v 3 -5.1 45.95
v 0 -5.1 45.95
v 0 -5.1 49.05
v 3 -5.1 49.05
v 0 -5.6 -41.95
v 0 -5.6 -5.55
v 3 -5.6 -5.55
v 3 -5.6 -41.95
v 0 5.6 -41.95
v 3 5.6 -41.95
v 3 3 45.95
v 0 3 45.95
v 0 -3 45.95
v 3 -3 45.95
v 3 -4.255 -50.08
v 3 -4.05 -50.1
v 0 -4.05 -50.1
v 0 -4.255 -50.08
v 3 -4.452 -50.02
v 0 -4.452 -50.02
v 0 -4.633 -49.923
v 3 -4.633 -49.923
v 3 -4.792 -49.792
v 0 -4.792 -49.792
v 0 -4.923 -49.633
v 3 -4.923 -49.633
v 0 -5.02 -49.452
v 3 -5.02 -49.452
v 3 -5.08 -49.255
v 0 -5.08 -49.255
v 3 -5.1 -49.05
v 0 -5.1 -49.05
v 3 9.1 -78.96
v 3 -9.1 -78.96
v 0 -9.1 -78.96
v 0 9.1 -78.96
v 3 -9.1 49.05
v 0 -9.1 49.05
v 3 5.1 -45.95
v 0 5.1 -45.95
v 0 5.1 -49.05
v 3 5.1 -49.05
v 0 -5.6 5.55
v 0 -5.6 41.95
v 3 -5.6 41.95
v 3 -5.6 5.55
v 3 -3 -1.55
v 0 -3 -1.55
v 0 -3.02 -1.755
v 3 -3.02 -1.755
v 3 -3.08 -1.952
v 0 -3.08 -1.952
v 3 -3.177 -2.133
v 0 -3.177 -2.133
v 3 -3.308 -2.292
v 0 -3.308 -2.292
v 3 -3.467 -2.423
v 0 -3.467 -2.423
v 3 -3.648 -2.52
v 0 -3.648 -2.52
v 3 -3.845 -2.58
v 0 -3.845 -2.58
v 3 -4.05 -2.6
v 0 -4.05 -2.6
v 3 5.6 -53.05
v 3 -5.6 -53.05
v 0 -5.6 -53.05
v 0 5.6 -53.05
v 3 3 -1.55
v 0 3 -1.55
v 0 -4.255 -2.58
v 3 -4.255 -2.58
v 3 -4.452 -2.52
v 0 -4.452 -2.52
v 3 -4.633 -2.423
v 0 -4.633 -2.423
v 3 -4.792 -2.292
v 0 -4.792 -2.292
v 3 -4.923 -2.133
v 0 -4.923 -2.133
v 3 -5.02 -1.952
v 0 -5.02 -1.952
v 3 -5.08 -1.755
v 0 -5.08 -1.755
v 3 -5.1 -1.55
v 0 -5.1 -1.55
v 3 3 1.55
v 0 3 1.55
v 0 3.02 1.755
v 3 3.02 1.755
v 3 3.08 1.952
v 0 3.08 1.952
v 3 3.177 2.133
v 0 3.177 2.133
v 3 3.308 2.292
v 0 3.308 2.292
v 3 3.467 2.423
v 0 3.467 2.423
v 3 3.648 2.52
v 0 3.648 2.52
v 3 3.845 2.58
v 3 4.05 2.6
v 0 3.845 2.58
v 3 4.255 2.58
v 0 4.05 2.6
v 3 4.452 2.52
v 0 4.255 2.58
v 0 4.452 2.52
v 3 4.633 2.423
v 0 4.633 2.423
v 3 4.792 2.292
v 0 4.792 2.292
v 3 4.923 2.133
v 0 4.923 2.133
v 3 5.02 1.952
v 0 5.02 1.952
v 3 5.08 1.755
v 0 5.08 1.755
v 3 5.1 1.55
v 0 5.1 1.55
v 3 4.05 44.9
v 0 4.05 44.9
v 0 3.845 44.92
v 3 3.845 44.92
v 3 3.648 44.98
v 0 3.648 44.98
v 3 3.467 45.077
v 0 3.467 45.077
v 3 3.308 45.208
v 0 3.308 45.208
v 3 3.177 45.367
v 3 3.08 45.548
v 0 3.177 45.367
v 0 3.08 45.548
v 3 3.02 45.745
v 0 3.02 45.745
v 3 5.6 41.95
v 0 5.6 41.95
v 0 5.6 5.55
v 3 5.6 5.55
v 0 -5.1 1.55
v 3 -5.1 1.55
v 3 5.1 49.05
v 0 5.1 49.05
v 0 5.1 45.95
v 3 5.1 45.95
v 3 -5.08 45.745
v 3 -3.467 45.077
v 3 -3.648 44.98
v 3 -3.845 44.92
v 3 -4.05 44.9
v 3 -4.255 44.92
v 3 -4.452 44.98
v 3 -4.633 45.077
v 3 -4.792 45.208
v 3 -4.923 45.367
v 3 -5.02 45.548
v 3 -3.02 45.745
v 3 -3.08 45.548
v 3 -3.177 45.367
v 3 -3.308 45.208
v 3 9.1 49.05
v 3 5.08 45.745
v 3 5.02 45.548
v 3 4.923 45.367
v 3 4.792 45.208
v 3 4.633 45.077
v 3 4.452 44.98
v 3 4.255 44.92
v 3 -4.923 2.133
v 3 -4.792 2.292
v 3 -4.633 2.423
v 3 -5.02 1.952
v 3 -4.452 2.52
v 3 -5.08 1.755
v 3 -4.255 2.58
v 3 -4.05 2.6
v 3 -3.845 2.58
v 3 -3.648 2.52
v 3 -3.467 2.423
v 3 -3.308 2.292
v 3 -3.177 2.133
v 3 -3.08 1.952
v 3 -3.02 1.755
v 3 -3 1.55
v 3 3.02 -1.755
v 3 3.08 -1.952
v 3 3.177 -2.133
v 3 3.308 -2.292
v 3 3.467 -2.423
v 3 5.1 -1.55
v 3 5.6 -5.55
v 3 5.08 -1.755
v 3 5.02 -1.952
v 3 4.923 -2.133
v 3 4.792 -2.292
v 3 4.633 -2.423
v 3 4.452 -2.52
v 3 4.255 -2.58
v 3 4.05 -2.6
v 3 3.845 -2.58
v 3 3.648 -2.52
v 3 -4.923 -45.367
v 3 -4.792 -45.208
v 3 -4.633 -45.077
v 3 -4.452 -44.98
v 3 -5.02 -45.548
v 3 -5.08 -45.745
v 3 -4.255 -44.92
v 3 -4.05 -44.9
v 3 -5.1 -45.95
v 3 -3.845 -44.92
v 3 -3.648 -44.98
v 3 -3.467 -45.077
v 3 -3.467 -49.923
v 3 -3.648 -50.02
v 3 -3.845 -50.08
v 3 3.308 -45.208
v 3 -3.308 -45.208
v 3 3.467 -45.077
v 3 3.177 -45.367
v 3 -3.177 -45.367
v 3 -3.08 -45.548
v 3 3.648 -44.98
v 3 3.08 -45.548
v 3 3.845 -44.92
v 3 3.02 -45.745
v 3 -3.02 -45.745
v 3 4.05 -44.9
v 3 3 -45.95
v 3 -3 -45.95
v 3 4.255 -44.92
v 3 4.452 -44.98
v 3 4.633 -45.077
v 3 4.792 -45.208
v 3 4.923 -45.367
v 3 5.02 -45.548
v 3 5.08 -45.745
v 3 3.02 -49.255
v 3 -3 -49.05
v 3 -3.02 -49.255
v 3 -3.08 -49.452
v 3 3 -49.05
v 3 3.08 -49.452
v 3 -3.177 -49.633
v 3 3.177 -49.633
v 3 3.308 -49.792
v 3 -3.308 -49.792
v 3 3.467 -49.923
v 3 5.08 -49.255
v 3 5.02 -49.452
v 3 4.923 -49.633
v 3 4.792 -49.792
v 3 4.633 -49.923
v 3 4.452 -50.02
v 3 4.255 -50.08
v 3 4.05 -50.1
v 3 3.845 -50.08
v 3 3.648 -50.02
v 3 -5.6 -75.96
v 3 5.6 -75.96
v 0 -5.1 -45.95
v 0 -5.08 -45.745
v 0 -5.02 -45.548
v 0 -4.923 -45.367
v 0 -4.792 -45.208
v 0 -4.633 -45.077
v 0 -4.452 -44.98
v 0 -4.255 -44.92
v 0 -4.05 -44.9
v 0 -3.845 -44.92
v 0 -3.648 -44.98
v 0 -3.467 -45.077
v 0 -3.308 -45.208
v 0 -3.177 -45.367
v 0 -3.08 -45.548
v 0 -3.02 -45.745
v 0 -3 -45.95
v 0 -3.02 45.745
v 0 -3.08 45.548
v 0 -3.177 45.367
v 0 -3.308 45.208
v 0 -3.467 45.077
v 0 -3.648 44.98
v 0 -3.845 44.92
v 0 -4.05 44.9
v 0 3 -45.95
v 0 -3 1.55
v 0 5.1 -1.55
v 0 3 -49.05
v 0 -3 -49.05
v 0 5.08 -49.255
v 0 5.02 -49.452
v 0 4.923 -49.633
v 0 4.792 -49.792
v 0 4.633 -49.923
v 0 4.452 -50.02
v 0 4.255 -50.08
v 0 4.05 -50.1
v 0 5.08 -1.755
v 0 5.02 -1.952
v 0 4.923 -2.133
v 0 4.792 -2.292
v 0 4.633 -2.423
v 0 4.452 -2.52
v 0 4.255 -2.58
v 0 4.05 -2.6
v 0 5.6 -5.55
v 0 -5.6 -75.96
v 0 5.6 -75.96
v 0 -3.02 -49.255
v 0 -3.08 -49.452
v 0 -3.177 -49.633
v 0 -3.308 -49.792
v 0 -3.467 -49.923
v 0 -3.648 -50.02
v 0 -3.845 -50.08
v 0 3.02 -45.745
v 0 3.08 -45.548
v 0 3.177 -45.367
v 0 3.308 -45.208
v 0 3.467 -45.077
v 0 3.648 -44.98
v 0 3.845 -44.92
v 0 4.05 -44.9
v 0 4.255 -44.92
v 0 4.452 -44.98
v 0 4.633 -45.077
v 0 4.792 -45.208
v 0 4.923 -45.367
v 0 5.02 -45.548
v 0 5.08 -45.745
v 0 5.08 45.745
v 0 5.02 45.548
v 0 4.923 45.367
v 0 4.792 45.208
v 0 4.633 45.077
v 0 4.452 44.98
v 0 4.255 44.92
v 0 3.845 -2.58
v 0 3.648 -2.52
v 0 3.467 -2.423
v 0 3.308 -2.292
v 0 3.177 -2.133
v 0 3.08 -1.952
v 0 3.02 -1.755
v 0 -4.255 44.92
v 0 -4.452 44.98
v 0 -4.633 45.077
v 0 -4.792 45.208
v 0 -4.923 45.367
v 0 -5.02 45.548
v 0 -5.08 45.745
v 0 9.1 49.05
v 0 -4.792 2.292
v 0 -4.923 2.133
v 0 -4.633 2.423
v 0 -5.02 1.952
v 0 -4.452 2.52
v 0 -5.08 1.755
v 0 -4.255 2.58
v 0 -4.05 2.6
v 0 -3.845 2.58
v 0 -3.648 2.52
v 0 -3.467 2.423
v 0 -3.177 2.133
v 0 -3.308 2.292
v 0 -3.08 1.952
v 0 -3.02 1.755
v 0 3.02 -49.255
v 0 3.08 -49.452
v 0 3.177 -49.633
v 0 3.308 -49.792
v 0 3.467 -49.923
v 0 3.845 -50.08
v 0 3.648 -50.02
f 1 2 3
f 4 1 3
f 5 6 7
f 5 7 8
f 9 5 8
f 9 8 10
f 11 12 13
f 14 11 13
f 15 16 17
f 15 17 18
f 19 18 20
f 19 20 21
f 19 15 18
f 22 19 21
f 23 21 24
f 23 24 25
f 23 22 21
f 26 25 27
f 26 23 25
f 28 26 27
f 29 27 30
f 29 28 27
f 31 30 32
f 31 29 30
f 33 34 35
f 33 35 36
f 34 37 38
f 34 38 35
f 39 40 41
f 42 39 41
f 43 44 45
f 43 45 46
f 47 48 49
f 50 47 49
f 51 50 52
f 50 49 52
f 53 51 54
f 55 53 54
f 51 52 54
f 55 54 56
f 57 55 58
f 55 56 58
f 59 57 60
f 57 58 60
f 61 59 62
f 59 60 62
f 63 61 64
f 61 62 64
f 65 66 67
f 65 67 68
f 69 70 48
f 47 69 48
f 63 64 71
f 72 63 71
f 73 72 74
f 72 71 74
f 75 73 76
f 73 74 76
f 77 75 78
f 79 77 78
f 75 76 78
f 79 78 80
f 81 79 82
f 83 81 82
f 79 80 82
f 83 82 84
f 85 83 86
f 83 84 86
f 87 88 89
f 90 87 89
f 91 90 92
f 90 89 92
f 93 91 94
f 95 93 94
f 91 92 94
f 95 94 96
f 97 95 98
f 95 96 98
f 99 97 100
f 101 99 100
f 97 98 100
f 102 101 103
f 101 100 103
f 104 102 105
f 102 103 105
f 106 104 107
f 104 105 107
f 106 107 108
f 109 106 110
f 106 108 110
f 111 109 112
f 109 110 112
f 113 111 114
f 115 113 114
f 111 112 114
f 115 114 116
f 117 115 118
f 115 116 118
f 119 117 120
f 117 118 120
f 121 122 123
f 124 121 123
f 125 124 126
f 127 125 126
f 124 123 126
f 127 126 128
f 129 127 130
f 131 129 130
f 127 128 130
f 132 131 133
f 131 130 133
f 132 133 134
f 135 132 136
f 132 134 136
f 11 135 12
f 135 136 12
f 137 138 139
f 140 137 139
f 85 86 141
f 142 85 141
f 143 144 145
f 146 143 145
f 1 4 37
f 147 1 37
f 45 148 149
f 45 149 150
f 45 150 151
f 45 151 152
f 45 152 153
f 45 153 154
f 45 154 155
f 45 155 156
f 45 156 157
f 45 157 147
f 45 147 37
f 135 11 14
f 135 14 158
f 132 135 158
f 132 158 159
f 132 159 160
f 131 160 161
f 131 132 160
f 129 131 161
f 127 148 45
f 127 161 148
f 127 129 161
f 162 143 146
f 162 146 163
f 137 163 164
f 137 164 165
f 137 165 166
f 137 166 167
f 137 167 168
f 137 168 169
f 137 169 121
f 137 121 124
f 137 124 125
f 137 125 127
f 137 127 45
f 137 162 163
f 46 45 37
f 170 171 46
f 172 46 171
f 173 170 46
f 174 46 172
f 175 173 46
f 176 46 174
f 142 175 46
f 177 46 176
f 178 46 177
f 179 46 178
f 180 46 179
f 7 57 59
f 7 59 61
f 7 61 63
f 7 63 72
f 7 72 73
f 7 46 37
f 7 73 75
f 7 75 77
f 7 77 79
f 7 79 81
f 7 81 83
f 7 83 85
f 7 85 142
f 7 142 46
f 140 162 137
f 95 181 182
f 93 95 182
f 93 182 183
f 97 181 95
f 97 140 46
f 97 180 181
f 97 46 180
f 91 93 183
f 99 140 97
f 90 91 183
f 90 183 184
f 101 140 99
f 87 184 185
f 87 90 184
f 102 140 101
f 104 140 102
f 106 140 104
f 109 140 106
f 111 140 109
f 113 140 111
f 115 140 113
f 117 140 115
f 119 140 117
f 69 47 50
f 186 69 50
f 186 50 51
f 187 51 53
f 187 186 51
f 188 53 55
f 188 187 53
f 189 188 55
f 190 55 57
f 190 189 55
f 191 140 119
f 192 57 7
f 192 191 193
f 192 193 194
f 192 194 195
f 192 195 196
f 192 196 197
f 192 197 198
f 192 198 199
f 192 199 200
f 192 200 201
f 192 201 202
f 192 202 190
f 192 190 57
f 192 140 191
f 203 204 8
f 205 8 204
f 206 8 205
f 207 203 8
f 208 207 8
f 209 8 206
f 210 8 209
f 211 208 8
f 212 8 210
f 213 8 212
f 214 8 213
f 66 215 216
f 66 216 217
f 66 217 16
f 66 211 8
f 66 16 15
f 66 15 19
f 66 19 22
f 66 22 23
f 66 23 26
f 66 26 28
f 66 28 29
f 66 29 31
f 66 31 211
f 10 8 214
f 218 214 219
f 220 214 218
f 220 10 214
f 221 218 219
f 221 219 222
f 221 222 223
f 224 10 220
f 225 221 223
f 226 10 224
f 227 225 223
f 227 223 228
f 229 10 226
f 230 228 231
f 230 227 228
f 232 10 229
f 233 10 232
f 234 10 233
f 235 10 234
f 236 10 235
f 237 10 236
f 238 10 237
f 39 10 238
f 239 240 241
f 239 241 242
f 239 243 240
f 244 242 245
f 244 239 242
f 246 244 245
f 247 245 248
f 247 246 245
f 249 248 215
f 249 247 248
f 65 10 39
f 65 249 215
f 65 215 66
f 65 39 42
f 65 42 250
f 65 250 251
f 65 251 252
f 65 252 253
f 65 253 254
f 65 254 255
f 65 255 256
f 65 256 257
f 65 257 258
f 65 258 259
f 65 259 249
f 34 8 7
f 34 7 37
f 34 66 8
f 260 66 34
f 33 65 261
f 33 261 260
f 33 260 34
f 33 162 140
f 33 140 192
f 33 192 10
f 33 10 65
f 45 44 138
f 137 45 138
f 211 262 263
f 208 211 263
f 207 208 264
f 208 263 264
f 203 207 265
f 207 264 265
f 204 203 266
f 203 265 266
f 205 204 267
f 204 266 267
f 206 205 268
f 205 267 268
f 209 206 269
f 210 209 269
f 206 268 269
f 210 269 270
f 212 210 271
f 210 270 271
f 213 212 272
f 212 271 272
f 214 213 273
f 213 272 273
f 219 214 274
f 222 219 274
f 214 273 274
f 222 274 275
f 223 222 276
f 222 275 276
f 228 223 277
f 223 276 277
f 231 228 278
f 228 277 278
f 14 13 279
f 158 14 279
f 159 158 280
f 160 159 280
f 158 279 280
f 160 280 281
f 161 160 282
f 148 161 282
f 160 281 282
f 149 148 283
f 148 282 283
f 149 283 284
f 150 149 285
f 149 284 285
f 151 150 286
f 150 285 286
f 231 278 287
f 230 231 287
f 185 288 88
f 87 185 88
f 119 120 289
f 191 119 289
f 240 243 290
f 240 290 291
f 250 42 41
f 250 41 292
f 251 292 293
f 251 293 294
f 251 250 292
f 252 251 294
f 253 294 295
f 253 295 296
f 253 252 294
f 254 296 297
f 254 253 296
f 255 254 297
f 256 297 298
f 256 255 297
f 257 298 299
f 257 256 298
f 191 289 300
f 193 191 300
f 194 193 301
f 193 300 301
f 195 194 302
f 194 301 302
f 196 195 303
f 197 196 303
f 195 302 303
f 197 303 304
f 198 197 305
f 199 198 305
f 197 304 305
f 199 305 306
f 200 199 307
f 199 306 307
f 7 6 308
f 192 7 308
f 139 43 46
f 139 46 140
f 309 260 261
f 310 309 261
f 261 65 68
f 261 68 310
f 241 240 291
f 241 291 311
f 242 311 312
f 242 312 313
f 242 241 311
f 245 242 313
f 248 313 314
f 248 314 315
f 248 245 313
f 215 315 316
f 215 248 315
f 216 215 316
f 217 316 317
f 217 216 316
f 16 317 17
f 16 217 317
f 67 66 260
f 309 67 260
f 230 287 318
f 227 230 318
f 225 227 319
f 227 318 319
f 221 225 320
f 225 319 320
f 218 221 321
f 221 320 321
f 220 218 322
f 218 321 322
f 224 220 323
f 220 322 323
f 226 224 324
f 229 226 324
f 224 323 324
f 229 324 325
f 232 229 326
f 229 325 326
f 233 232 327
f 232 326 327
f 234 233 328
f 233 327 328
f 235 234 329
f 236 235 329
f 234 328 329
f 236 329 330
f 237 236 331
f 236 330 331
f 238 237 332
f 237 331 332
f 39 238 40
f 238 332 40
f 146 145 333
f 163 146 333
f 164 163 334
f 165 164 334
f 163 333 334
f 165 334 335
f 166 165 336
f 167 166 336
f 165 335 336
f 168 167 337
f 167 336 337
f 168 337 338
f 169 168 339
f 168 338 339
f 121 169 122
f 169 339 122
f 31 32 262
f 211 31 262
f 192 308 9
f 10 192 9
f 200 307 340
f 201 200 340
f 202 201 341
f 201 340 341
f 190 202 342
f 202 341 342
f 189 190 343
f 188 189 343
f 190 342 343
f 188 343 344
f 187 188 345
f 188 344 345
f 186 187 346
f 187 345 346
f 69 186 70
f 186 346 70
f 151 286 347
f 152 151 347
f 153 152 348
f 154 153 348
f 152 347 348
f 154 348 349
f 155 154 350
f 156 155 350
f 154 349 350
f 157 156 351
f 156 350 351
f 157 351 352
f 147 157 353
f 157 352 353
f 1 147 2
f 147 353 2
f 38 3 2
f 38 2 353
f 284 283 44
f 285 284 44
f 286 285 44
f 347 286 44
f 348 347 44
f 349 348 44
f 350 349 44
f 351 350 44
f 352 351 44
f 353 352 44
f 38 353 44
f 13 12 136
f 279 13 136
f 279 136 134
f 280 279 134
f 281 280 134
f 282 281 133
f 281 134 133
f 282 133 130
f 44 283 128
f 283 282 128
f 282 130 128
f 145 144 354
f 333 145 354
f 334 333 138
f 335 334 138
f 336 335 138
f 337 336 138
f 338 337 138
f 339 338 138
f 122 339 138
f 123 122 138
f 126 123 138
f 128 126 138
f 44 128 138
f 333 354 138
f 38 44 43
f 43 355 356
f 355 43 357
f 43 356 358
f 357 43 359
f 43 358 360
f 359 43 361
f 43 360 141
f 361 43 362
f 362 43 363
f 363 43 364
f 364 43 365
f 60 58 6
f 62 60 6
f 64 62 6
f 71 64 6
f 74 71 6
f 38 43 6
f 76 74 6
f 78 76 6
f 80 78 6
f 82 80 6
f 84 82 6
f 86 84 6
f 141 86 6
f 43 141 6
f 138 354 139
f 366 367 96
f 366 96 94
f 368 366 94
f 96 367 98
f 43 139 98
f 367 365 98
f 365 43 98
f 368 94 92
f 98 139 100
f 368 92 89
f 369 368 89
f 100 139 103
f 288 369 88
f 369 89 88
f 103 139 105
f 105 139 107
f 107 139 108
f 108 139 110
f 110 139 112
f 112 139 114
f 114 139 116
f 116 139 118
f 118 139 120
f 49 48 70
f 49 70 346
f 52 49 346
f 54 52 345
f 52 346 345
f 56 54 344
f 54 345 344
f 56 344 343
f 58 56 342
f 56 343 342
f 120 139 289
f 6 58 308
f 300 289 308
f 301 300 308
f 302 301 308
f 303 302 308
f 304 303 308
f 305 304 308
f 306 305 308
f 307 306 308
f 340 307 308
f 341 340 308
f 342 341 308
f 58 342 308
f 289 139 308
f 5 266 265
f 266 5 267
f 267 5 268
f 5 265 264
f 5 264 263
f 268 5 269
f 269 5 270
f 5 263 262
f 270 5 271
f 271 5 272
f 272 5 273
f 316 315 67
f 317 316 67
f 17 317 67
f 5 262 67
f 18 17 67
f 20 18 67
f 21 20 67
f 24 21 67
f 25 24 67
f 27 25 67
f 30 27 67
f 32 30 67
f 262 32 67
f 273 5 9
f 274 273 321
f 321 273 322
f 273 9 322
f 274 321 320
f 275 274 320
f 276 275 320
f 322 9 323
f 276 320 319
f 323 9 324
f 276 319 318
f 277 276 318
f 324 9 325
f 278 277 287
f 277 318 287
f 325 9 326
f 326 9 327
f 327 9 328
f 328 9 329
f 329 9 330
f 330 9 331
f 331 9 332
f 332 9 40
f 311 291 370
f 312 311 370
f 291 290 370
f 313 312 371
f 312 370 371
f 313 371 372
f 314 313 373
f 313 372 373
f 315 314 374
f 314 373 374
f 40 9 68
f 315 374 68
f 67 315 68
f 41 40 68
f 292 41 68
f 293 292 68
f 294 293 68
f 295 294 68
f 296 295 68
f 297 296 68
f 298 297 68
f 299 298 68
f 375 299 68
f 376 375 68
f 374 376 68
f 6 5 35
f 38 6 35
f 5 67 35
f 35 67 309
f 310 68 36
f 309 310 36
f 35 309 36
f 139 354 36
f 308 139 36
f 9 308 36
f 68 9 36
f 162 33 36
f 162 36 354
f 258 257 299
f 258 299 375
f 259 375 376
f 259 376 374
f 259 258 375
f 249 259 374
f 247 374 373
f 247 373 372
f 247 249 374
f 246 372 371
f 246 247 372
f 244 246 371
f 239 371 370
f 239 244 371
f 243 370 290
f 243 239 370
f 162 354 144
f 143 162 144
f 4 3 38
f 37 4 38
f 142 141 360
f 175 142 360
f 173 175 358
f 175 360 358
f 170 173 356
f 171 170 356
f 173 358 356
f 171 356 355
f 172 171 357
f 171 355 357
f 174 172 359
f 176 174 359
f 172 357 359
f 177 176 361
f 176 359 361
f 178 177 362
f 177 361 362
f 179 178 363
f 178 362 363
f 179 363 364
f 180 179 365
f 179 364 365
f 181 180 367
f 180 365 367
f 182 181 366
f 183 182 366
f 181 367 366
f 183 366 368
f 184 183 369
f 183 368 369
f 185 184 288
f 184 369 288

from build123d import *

# Parameters (mm, degrees)
SKETCH_1_W      = 36.4
SKETCH_1_H      = 11.2
EXTRUDE_1_DEPTH = 3
SKETCH_2_W      = 22.91
SKETCH_2_H      = 11.2
EXTRUDE_2_DEPTH = 3


with BuildPart() as part:
    # 草图1 → 凸台-拉伸1 (new body)
    with BuildSketch(Plane(origin=(0, 0, 0), x_dir=(0, 0, -1), z_dir=(1, 0, 0))):
        with BuildLine():
            ThreePointArc((-44.9, -4.05), (-45.20753788, -4.79246212), (-45.95, -5.1))
            Line((-45.95, -5.1), (-49.05, -5.1))
            Line((-49.05, -5.1), (-49.05, -9.1))
            Line((-49.05, -9.1), (49.05, -9.1))
            Line((49.05, -9.1), (49.05, -5.1))
            Line((49.05, -5.1), (45.95, -5.1))
            ThreePointArc((45.95, -5.1), (44.9, -4.05), (45.95, -3))
            Line((45.95, -3), (45.95, 3))
            ThreePointArc((45.95, 3), (44.9, 4.05), (45.95, 5.1))
            Line((45.95, 5.1), (49.05, 5.1))
            Line((49.05, 5.1), (49.05, 9.1))
            Line((49.05, 9.1), (-49.05, 9.1))
            Line((-49.05, 9.1), (-49.05, 5.1))
            Line((-49.05, 5.1), (-45.95, 5.1))
            ThreePointArc((-45.95, 5.1), (-45.20753788, 4.79246212), (-44.9, 4.05))
            ThreePointArc((-44.9, 4.05), (-45.20753788, 3.30753788), (-45.95, 3))
            Line((-45.95, 3), (-45.95, -3))
            ThreePointArc((-45.95, -3), (-45.20753788, -3.30753788), (-44.9, -4.05))
        make_face()
        with Locations((-23.75, 0)):
            Rectangle(SKETCH_1_W, SKETCH_1_H, mode=Mode.SUBTRACT)
        with BuildLine():
            ThreePointArc((2.6, -4.05), (2.29246212, -4.79246212), (1.55, -5.1))
            Line((1.55, -5.1), (-1.55, -5.1))
            ThreePointArc((-1.55, -5.1), (-2.6, -4.05), (-1.55, -3))
            Line((-1.55, -3), (-1.55, 3))
            ThreePointArc((-1.55, 3), (-2.6, 4.05), (-1.55, 5.1))
            Line((-1.55, 5.1), (1.55, 5.1))
            ThreePointArc((1.55, 5.1), (2.29246212, 4.79246212), (2.6, 4.05))
            ThreePointArc((2.6, 4.05), (2.29246212, 3.30753788), (1.55, 3))
            Line((1.55, 3), (1.55, -3))
            ThreePointArc((1.55, -3), (2.29246212, -3.30753788), (2.6, -4.05))
        make_face(mode=Mode.SUBTRACT)
        with Locations((23.75, 0)):
            Rectangle(SKETCH_1_W, SKETCH_1_H, mode=Mode.SUBTRACT)
    extrude(amount=EXTRUDE_1_DEPTH)

    # 草图2 → 凸台-拉伸2 (add)
    with BuildSketch(Plane(origin=(3, 0, 0), x_dir=(0, 0, -1), z_dir=(1, 0, 0))):
        with BuildLine():
            Line((49.05, -5.1), (49.05, -9.1))
            Line((49.05, -9.1), (78.96, -9.1))
            Line((78.96, -9.1), (78.96, 9.1))
            Line((78.96, 9.1), (49.05, 9.1))
            Line((49.05, 9.1), (49.05, 5.1))
            ThreePointArc((49.05, 5.1), (49.79246212, 4.79246212), (50.1, 4.05))
            ThreePointArc((50.1, 4.05), (49.79246212, 3.30753788), (49.05, 3))
            Line((49.05, 3), (49.05, -3))
            ThreePointArc((49.05, -3), (49.79246212, -3.30753788), (50.1, -4.05))
            ThreePointArc((50.1, -4.05), (49.79246212, -4.79246212), (49.05, -5.1))
        make_face()
        with Locations((64.505, 0)):
            Rectangle(SKETCH_2_W, SKETCH_2_H, mode=Mode.SUBTRACT)
    extrude(amount=-EXTRUDE_2_DEPTH)


solid = part.part
